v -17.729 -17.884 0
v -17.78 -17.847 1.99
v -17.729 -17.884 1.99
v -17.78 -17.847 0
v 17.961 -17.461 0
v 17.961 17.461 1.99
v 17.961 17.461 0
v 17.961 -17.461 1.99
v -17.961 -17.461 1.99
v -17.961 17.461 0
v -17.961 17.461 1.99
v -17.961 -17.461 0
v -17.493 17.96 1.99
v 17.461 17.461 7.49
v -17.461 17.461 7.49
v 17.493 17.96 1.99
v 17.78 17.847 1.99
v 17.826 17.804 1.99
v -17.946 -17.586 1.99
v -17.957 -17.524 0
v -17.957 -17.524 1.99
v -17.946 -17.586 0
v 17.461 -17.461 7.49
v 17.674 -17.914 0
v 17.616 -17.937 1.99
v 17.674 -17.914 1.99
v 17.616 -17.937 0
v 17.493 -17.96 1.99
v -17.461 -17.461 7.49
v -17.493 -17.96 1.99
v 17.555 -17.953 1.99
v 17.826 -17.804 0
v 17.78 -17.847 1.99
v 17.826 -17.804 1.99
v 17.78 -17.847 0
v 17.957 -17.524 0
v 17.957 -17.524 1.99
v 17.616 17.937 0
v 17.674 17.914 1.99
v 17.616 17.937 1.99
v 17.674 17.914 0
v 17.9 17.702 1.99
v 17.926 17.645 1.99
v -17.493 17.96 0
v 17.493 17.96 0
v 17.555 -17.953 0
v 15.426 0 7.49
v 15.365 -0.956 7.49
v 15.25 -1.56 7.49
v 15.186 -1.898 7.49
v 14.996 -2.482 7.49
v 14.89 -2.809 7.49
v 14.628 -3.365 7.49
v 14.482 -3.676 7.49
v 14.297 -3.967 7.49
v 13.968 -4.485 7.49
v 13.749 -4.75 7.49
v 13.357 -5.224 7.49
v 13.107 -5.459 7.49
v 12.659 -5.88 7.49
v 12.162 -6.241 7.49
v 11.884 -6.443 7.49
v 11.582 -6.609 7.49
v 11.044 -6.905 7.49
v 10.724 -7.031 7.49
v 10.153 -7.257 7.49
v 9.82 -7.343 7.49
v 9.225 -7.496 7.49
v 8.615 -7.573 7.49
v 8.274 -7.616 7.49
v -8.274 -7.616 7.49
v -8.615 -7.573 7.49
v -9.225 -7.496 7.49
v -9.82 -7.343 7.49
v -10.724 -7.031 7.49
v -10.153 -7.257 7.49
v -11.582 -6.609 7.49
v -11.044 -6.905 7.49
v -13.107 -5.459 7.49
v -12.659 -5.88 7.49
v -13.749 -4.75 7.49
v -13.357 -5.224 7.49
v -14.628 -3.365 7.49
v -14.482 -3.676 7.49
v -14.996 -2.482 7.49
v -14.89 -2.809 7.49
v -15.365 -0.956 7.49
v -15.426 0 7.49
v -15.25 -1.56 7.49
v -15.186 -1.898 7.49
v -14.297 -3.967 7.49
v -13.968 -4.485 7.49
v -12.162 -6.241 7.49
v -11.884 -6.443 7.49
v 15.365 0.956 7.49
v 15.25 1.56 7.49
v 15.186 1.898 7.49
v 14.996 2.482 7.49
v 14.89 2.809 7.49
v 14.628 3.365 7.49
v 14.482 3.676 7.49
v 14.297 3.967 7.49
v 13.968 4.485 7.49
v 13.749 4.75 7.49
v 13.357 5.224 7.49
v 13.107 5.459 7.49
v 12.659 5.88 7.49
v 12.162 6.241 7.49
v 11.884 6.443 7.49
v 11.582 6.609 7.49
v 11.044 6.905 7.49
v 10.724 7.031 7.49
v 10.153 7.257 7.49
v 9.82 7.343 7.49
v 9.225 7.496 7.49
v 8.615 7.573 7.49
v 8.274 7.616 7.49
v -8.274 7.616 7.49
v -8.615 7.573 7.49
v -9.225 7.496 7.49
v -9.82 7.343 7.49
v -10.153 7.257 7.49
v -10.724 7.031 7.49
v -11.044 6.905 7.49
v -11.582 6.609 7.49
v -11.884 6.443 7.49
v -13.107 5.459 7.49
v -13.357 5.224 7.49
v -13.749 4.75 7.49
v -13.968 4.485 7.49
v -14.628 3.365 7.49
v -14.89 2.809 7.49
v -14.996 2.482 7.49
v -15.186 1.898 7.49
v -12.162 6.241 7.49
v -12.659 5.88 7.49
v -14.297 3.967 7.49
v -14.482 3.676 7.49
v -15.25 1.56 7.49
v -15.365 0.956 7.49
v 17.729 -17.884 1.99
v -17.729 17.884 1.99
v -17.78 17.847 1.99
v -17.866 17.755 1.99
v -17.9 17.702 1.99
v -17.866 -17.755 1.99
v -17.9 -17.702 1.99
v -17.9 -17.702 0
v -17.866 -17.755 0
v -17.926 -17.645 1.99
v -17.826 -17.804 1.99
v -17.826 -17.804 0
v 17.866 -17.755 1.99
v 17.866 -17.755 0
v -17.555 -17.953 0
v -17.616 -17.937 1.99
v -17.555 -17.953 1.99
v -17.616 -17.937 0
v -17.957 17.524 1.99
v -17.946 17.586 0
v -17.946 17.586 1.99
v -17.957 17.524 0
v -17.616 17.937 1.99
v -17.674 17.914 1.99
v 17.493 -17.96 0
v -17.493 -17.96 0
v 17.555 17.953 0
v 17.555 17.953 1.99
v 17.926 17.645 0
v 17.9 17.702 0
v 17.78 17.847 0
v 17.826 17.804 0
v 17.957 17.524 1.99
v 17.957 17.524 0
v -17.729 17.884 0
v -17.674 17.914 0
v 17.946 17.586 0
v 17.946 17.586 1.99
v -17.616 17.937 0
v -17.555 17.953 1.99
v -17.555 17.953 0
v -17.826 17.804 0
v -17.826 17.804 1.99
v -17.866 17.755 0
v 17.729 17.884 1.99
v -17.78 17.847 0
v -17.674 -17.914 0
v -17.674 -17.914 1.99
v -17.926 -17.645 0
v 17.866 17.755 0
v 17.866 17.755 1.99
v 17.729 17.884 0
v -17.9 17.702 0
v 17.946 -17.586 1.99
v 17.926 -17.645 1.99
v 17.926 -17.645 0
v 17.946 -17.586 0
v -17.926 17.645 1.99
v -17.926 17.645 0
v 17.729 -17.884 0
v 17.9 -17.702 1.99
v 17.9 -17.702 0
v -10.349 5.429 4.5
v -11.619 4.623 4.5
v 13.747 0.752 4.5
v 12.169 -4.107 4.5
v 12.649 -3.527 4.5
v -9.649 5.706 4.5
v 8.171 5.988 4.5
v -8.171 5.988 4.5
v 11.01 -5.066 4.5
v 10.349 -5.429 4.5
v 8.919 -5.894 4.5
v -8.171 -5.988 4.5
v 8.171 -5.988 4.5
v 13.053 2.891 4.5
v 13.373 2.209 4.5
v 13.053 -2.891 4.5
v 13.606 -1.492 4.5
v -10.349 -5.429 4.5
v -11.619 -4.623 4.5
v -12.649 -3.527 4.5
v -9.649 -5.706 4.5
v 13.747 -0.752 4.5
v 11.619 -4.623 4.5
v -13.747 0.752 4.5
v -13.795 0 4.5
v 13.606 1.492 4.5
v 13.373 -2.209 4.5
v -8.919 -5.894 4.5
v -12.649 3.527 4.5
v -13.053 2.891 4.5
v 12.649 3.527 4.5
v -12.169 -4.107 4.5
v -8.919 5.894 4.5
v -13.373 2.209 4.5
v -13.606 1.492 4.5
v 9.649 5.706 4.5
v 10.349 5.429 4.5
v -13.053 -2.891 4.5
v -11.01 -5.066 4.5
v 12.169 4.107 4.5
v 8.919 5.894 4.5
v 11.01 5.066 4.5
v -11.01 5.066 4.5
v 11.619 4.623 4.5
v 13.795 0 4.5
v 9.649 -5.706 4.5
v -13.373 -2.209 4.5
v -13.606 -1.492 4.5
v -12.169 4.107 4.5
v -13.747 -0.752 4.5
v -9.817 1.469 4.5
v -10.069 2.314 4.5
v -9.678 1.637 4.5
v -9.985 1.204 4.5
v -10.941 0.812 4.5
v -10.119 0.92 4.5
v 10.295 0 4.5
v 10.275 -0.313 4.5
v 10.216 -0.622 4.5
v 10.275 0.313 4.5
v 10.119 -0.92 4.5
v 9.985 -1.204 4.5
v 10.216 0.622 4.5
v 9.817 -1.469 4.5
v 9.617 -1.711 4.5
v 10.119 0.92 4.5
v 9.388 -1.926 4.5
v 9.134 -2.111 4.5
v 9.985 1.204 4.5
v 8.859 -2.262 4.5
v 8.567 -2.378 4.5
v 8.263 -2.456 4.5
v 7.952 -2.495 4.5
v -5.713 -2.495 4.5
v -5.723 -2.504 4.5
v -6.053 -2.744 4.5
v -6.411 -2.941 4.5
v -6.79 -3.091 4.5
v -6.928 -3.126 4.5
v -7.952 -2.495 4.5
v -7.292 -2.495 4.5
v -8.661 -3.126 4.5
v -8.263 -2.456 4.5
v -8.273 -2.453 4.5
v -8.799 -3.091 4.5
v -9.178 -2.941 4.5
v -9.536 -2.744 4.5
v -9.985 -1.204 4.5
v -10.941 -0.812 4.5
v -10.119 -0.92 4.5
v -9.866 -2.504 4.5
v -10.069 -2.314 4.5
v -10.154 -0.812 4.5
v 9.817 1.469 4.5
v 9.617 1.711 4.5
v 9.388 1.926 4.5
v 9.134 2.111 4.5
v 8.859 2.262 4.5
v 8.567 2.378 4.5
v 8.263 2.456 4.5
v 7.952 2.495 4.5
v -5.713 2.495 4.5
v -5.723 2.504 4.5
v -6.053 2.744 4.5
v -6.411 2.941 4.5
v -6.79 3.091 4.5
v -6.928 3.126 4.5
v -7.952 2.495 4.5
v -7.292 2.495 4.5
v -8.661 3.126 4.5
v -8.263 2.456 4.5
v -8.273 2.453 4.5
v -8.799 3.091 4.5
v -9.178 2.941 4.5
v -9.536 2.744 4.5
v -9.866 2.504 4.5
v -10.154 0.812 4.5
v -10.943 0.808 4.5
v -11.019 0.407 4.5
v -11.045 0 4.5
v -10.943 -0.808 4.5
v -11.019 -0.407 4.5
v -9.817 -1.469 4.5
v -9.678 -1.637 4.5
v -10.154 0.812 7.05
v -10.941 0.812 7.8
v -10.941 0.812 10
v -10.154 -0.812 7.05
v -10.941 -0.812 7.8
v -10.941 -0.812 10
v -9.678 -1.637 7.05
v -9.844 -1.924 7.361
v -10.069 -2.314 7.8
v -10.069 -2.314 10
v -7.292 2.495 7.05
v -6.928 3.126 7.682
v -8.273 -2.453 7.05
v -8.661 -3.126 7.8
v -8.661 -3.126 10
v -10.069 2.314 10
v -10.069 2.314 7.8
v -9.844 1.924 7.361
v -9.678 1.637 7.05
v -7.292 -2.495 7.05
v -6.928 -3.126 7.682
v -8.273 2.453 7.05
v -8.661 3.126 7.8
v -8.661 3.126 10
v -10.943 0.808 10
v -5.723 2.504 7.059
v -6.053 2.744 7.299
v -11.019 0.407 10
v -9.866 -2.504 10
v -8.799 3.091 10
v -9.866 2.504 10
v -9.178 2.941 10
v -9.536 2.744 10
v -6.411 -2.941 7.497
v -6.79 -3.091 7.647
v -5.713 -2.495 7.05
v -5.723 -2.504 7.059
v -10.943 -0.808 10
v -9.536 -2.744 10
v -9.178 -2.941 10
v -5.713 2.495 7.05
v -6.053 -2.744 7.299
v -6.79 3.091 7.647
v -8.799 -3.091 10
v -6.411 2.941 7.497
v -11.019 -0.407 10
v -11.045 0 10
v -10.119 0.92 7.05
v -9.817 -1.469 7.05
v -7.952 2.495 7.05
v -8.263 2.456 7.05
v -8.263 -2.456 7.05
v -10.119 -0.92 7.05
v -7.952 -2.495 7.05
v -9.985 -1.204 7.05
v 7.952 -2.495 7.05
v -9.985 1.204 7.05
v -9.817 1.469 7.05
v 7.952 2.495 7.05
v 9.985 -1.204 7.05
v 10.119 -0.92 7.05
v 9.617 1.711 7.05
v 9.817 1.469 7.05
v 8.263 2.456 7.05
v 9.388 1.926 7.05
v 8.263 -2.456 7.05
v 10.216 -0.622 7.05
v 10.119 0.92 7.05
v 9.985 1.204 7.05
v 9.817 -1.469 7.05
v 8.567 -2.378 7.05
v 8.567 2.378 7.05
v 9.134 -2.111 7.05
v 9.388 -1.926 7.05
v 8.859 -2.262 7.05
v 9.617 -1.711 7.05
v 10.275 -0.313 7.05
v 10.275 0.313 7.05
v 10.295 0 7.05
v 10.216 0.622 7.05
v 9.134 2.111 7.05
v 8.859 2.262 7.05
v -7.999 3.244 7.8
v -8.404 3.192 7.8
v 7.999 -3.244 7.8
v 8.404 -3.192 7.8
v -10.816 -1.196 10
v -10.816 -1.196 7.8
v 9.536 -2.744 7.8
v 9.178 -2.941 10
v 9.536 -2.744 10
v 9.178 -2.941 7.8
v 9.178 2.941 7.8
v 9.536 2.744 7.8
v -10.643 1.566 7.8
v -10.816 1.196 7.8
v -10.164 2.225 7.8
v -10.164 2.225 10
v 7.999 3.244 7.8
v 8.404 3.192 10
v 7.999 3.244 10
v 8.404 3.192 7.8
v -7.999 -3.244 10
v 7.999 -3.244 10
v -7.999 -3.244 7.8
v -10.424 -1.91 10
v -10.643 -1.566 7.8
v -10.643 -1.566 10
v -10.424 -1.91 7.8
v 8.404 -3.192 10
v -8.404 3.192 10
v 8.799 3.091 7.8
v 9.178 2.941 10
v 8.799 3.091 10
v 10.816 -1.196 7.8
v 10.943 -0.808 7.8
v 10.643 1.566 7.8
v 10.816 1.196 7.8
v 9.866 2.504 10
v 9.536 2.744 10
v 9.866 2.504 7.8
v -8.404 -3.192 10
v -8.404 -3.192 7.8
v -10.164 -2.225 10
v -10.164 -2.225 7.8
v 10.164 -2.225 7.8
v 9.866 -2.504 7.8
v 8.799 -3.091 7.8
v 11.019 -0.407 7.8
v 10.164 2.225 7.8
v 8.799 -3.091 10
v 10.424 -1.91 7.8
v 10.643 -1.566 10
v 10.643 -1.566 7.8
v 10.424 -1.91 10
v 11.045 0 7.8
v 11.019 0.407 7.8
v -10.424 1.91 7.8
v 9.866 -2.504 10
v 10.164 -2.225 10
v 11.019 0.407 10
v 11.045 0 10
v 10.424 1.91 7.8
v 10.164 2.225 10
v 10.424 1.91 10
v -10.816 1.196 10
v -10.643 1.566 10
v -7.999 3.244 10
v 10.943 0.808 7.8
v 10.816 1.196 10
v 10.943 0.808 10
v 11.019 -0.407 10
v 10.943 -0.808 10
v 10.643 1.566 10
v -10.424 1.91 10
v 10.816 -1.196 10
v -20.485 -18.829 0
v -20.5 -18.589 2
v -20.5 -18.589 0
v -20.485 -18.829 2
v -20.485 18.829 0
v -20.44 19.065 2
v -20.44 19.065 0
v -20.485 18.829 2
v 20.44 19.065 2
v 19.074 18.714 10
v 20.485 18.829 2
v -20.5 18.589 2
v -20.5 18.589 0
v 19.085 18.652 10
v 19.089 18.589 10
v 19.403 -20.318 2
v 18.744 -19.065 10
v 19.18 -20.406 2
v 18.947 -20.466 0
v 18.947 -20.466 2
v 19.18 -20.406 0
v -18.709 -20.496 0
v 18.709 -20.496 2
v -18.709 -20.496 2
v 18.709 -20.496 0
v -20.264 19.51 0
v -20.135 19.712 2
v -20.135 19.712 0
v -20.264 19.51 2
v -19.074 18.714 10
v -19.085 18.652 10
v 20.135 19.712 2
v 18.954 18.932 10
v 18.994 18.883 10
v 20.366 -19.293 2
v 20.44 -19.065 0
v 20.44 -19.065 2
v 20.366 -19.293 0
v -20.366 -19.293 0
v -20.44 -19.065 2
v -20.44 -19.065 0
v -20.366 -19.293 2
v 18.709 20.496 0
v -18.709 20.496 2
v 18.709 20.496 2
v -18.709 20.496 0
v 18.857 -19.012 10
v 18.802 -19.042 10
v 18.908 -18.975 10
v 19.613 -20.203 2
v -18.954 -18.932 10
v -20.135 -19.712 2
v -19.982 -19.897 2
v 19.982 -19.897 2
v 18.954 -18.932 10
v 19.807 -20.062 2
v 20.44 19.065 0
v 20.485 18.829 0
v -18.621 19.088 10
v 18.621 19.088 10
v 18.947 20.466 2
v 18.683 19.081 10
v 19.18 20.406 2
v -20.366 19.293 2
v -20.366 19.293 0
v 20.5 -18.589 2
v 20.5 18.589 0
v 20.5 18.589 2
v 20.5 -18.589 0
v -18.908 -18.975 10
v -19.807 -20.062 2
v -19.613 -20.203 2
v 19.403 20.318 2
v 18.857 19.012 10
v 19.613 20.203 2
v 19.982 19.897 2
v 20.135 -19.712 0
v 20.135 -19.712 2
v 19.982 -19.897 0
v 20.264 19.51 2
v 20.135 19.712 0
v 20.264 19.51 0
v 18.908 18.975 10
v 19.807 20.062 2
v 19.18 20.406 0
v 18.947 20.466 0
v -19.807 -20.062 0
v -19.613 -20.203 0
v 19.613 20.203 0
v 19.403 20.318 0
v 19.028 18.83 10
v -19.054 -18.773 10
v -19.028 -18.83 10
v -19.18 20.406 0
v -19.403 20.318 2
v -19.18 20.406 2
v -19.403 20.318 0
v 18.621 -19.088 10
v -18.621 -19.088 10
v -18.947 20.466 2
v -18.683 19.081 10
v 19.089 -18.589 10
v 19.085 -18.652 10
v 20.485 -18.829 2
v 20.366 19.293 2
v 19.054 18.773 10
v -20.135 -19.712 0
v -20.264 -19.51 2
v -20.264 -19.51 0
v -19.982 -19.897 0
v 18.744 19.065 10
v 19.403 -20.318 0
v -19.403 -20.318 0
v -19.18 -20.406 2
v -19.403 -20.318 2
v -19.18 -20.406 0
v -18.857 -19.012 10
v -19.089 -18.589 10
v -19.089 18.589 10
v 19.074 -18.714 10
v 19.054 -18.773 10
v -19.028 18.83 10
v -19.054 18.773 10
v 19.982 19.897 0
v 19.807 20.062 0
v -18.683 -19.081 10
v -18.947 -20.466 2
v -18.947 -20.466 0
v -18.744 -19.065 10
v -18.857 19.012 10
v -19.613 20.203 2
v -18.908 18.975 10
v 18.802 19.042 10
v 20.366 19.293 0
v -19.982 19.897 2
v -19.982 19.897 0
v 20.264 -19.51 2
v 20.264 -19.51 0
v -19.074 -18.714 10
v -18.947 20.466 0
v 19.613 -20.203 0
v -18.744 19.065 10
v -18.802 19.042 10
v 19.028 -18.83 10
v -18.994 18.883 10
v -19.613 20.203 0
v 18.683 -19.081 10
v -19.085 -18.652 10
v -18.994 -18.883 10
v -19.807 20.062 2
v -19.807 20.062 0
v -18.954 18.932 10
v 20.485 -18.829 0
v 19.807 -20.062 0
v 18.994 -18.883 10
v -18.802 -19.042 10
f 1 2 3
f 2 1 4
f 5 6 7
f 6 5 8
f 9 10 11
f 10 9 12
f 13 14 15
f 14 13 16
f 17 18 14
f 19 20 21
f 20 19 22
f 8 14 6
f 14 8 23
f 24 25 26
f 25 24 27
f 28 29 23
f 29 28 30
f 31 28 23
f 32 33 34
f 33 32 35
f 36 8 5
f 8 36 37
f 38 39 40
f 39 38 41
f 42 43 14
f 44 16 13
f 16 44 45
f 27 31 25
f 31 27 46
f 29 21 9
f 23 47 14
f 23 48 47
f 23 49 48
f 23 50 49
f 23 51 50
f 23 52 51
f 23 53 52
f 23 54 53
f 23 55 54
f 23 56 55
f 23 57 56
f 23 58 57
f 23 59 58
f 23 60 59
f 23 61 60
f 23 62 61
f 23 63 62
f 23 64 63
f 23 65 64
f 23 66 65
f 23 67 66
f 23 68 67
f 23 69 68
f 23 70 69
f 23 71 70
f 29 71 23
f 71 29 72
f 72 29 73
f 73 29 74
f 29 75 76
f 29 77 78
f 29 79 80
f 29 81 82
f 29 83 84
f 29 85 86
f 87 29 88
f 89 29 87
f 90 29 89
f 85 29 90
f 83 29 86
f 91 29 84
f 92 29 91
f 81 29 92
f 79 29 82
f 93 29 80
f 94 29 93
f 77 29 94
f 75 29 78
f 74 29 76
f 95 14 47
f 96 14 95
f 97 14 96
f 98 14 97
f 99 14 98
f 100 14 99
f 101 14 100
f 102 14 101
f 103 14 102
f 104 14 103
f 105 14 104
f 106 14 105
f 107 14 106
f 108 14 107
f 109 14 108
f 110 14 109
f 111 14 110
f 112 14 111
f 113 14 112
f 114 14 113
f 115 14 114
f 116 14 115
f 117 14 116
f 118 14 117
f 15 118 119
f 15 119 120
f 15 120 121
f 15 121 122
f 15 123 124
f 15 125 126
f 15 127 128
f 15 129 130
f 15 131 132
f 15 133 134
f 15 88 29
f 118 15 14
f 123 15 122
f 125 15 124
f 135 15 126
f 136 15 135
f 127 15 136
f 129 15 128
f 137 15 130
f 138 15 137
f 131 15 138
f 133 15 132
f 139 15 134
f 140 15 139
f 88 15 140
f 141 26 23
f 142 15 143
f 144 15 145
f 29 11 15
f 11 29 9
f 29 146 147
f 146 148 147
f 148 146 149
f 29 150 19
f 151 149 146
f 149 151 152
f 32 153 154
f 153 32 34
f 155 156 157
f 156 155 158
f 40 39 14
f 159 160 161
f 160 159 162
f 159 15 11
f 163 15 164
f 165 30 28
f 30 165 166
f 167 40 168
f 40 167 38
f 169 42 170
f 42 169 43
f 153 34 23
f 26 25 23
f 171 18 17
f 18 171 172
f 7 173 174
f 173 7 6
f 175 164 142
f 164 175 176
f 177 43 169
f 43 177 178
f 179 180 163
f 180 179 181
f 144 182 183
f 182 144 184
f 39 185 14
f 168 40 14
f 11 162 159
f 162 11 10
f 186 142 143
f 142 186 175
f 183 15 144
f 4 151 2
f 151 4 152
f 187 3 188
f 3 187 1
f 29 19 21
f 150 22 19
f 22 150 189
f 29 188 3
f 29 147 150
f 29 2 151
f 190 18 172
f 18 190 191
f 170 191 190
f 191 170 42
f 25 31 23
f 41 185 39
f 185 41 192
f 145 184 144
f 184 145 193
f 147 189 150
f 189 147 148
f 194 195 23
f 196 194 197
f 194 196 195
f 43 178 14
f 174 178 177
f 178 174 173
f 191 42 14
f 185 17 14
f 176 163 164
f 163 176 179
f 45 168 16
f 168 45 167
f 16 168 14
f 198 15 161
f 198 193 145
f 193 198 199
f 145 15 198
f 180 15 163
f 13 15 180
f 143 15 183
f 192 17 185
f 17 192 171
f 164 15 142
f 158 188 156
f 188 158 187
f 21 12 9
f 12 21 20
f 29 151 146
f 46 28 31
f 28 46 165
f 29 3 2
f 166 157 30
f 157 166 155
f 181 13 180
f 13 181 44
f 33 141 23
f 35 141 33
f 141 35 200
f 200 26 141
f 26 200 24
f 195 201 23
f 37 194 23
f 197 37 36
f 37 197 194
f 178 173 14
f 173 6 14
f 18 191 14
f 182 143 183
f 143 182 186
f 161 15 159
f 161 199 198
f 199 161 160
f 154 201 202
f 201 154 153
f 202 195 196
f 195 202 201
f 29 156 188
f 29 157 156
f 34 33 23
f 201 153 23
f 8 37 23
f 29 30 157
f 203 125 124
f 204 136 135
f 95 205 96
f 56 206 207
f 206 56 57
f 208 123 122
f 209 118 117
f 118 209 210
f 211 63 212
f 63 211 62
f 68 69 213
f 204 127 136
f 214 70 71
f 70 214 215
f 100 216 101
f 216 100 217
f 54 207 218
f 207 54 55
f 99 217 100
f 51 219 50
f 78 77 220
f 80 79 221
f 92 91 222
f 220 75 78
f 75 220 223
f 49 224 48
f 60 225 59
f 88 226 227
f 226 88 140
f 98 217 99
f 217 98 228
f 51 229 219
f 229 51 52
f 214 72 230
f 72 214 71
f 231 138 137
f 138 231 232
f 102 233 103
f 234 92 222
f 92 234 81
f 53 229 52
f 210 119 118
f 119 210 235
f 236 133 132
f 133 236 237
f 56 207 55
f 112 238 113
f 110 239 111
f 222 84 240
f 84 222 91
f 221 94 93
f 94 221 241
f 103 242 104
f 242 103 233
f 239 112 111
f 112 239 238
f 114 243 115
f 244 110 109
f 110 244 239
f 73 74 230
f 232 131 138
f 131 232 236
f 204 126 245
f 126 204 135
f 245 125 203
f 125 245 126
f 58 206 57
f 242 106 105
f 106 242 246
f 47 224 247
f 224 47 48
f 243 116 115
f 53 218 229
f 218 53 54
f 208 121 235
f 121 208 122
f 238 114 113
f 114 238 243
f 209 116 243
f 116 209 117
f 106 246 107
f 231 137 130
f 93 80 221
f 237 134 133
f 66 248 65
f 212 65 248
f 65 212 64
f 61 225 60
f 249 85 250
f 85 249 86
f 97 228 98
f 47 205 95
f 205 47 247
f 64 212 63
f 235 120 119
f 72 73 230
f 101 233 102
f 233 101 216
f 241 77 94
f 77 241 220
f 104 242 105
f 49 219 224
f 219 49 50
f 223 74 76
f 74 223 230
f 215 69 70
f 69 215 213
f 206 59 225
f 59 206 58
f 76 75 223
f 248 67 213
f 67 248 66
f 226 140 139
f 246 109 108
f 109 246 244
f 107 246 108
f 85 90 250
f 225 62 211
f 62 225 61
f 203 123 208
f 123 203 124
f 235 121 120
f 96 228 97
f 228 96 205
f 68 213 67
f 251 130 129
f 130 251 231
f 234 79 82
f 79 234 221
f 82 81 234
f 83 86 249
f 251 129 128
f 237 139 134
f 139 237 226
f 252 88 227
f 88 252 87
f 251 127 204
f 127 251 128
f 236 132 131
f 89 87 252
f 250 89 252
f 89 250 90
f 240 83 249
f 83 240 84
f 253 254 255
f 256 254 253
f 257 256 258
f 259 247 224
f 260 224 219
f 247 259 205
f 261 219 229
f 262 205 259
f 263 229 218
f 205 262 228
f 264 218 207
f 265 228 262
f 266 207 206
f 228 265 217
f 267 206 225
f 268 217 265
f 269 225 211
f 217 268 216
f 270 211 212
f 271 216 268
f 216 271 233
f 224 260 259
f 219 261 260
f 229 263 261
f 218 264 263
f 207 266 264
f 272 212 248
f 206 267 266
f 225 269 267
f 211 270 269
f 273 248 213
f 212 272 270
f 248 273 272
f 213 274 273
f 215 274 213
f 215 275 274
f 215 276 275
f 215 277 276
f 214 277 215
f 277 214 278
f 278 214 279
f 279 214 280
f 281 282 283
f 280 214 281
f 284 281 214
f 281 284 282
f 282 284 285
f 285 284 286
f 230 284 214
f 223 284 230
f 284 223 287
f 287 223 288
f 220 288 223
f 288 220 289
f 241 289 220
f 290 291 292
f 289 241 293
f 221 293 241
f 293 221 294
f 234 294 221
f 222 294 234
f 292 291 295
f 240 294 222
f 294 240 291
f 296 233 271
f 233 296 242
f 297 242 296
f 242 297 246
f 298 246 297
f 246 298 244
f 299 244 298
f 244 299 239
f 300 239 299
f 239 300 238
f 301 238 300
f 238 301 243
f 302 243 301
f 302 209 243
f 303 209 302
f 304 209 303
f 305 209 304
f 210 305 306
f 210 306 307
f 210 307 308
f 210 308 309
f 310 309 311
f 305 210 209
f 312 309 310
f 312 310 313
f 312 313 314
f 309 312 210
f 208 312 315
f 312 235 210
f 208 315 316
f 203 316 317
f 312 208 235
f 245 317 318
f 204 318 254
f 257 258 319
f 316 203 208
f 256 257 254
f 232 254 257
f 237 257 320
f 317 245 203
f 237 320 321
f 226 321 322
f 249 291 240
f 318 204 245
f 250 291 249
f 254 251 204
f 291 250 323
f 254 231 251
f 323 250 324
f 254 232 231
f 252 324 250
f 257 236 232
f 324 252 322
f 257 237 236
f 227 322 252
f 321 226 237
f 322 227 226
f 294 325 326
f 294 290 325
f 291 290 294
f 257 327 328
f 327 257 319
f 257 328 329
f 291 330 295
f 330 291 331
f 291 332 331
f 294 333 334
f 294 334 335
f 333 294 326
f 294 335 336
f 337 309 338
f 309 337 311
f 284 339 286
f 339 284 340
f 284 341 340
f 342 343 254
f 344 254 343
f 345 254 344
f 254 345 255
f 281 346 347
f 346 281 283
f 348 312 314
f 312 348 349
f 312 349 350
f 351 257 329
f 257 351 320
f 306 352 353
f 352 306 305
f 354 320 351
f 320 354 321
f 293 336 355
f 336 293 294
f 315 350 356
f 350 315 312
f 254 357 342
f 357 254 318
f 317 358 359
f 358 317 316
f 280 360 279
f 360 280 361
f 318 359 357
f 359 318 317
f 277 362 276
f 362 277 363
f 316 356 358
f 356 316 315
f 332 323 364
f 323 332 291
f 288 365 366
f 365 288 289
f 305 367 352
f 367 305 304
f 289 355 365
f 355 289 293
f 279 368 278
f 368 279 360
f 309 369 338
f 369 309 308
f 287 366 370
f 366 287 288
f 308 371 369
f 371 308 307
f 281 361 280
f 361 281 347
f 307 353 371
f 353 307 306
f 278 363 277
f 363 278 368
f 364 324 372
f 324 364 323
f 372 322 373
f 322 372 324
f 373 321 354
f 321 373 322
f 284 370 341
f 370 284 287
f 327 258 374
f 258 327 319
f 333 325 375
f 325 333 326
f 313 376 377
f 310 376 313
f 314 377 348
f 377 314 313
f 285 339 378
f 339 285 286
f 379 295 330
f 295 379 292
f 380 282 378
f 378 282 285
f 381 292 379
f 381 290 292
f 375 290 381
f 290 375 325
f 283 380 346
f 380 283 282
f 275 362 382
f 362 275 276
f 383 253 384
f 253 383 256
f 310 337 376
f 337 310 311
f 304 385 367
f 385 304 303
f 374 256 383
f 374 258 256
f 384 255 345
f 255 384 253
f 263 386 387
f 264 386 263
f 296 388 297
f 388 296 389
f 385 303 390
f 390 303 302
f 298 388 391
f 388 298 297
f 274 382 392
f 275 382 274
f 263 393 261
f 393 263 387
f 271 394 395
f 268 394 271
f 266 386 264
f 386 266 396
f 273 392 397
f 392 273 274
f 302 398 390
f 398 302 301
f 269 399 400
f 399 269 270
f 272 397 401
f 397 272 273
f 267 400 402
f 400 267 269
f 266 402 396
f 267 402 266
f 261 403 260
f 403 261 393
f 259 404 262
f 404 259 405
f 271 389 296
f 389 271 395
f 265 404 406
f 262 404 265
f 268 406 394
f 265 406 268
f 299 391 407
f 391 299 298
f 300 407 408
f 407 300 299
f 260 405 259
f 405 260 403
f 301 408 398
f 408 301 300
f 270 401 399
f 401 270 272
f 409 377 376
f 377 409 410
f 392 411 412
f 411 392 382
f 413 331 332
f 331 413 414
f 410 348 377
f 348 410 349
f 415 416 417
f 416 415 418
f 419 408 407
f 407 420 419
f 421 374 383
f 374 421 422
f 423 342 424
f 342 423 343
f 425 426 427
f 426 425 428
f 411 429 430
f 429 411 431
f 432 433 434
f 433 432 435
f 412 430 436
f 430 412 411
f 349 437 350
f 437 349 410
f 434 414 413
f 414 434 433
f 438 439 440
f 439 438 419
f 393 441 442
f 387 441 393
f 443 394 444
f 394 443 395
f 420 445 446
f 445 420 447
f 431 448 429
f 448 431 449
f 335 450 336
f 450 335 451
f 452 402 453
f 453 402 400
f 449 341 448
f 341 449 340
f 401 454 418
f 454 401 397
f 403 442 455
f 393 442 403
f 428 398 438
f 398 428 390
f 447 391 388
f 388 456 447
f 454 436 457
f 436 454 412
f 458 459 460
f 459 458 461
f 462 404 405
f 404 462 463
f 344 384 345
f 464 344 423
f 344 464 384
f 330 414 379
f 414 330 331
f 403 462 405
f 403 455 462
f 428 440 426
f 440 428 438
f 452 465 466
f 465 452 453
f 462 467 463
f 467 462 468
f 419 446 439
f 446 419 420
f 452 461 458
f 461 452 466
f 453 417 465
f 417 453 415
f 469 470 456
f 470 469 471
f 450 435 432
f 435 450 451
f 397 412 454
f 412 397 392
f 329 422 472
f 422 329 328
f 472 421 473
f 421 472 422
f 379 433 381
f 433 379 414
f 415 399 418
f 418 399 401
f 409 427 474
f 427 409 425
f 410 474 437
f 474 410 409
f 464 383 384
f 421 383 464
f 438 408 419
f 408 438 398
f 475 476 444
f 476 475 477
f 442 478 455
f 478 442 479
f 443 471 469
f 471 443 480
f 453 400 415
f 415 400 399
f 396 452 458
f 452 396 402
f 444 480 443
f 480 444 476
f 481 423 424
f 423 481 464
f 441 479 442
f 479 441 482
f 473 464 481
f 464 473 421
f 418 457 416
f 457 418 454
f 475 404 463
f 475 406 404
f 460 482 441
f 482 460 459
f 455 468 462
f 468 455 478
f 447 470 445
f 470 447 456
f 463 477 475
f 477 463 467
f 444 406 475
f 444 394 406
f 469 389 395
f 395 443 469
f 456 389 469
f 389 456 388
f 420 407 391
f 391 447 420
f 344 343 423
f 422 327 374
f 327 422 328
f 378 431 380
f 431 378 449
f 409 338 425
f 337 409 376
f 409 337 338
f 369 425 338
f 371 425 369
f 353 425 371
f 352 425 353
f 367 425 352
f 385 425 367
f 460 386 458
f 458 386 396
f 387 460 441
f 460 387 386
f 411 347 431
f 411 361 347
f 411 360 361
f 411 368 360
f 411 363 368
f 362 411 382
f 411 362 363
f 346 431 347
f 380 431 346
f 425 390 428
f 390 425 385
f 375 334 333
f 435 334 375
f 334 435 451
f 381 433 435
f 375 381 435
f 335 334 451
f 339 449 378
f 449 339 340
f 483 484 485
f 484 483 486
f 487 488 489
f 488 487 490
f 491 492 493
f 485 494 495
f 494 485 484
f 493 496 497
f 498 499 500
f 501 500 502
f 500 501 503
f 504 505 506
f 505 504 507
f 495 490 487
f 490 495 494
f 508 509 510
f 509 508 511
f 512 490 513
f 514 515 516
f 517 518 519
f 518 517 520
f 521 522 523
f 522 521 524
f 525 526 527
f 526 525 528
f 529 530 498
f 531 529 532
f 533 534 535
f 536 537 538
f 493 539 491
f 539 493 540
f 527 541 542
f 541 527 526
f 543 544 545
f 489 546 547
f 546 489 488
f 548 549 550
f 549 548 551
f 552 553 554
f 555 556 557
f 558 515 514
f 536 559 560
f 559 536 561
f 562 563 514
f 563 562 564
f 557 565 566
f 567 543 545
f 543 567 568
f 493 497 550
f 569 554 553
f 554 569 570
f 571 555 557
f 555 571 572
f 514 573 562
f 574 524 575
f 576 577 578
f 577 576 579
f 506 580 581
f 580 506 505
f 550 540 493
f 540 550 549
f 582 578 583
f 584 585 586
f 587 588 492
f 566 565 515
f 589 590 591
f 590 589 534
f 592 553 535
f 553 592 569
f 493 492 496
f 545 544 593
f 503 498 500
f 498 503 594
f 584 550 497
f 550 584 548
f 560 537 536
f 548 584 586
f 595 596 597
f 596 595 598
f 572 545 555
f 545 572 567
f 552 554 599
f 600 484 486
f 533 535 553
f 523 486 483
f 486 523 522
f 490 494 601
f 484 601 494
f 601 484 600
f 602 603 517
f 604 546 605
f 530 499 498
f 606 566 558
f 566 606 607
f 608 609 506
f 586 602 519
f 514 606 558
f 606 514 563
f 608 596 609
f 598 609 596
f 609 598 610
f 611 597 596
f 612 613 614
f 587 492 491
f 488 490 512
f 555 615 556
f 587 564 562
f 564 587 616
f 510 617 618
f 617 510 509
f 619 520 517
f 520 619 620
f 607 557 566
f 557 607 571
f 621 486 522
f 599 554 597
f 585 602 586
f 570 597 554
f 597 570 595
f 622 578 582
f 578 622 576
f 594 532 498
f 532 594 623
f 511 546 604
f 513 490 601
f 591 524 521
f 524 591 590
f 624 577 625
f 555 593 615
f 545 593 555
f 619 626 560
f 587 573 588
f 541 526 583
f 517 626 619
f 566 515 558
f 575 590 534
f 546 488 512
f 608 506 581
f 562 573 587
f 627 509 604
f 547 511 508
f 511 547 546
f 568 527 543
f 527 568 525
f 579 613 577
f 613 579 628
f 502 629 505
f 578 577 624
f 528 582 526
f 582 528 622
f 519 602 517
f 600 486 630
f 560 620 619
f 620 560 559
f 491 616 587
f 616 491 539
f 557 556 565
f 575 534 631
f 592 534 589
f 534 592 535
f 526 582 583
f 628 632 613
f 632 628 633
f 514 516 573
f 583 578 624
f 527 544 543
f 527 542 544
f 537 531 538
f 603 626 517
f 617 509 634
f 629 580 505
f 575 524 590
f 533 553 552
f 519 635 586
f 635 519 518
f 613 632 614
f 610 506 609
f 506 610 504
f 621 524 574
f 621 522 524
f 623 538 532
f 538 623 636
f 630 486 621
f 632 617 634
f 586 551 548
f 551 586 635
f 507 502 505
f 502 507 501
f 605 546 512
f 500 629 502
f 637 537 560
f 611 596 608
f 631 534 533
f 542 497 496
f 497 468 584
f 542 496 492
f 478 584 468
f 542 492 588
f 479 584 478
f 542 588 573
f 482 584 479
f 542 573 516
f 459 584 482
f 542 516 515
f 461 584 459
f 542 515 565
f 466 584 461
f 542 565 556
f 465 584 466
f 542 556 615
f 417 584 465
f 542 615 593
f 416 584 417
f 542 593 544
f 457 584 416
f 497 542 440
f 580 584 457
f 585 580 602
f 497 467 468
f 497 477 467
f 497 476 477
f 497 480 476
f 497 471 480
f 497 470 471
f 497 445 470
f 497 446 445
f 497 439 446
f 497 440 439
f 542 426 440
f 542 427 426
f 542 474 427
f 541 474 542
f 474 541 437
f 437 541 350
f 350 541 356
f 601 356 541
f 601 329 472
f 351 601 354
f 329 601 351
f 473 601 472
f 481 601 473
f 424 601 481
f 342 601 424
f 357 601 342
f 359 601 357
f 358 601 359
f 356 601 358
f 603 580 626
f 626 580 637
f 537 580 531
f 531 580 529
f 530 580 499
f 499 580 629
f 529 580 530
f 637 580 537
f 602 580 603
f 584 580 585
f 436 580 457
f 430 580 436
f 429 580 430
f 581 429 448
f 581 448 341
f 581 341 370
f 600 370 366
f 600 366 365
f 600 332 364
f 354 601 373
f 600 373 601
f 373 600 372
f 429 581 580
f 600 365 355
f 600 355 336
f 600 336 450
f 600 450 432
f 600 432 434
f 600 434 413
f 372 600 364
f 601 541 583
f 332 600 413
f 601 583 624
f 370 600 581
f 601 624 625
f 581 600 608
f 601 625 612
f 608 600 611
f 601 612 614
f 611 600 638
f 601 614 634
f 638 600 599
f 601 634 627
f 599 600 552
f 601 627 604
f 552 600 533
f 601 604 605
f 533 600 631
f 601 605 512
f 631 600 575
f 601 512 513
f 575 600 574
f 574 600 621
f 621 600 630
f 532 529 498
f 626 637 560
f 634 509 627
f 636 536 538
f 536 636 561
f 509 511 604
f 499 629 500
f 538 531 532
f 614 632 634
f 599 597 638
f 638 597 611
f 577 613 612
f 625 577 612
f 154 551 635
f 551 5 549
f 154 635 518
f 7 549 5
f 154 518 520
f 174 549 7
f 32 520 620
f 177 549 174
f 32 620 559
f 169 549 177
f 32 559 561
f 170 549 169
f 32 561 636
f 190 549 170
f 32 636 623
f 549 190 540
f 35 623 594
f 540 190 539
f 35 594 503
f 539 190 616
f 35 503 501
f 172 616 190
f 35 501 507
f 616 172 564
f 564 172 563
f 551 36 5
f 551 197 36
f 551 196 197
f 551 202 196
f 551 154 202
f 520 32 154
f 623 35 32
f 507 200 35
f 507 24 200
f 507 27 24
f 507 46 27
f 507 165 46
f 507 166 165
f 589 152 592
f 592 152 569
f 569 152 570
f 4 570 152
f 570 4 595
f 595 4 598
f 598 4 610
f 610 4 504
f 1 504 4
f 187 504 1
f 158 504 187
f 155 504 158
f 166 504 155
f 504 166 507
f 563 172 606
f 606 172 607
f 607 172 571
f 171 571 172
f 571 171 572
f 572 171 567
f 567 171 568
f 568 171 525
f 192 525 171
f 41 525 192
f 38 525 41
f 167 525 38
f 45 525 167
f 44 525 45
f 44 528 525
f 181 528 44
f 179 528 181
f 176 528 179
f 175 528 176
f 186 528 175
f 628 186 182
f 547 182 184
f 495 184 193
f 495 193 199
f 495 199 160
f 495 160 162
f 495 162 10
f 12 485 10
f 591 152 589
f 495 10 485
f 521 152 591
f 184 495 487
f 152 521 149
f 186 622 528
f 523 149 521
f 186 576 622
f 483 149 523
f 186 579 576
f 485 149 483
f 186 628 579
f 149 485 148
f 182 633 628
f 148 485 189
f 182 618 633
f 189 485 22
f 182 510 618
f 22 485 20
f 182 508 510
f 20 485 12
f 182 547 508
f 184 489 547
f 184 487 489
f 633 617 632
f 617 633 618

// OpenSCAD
// Tripod Mount Plate

//
// Plate dimensions
//

// Plate X size, mm
size_x = 41;
// Plate Y size, mm
size_y = 41;

// Wall thickness, mm
wall_thickness = 2.5;

// Slope of side walls, degrees
side_slope = 10;
// Height of non-sloped part of the wall, must be > 0
slope_start_height = 2;

// Radius of plat corners, mm
top_corner_radius = 0.5;

//
// Screw properties
//

// Screw full length, including head, mm
screw_full_length = 14.3;

// How much of the screw should stick outside, mm.  Usually it is the deepness of mount screw hole in the camera
screw_work_length = 4.8;
// Length of non-threaded screw part (grip, neck, shank), mm
screw_shank_length = 3.5;

// Diameter of non-threaded screw part, mm.  Determines the narrower part of the slot
shank_shaft_diameter = 5.0;
// Diameter of threaded part screw port, mm.  Determines the wider part of the slot
thread_shaft_diameter = 6.5;

// Length of the screw head, mm
screwhead_length = 4;
// Diameter of the screw head, mm
screwhead_diameter = 12;

//
// computed properties
//
$fn = 0 + 50;

size_z = 0.5 + screw_full_length - screw_work_length;
wall_x = wall_thickness / cos(side_slope);

slope_x = (size_z - slope_start_height) * tan(side_slope);

internal_size_x = size_x - slope_x;
bottom_corner_radius = top_corner_radius + slope_x;

shank_shaft_radius = shank_shaft_diameter / 2;
thread_shaft_radius = thread_shaft_diameter / 2;
screwhead_radius = screwhead_diameter / 2;

screw_length = screw_full_length - screwhead_length;
screw_thread_length = screw_length - screw_shank_length;
screw_inside_length = screw_length - screw_work_length;
threaded_shaft_length = size_z - screw_thread_length;

slot_start = internal_size_x / 2 - screwhead_diameter;
slot_end = -slot_start;

module plate() {
  difference()
  {
      plateBlock();
      drillouts();
  }
}

module plateBlock() {
  roundedCube(size_x, size_y, size_z, bottom_corner_radius, top_corner_radius);
}


module roundedCube(x, y, z, r1, r2)
{
    translate([-x/2 + r1, -y / 2 + r1, 0])
      minkowski() {
        cube([x-2*r1,y-2*r1,slope_start_height]);
        cylinder(r1=r1,r2=r2,h = z - slope_start_height);
      };
}

module drillouts() {
    internalFacet();
    shankShaft();
    threadedShaft();
    eye();
}

module internalFacet() {
  difference() {
    translate([0, 0, -0.01])
    roundedCube(
      size_x - 2 * wall_x,
      size_y - 2 * wall_x,
      size_z - wall_thickness,
      top_corner_radius, 0);
    screwheadPad();
  }
}

module shankShaft() {
  hull() {
    translate([slot_start, 0, 0]) shankShaftBase();
    translate([slot_end, 0, 0]) shankShaftBase();
  }
}

module shankShaftBase() {
  cylinder(h=size_z + 0.01, r=shank_shaft_radius);
}

module threadedShaft() {
  hull() {
    translate([slot_start, 0, 0]) threadedShaftBase();
    translate([slot_end, 0, 0]) threadedShaftBase();
  }
}

module threadedShaftBase() {
  translate([0, 0, size_z + 1])
  hull() {
    translate([0, 0, -thread_shaft_radius])
      cylinder(r1 = 0, r2 = thread_shaft_radius, h = thread_shaft_radius);
    translate([0, 0, -thread_shaft_radius - threaded_shaft_length])
      cylinder(r1 = 0, r2 = thread_shaft_radius, h = thread_shaft_radius);
  }
}

module eye() {
  translate([slot_end, 0, 0]) {
    cylinder(h=size_z + 0.01, r = shank_shaft_radius);
    intersection() {
      cylinder(h=size_z + 0.01, r = thread_shaft_radius);
      for(angle = [0:60:360]) {
        rotate(angle)
          cube(size=[thread_shaft_radius * 10, thread_shaft_radius * 0.5, 2 * size_z + 2], center=true);
      }
    }
  }
}

module screwheadPad() {
  z_start = 0.5 + screwhead_length;
  h = size_z - z_start;

  translate([0, 0, z_start])
  hull() {
    translate([slot_start, 0, 0]) screwheadPadBase(h);
    translate([slot_end, 0, 0]) screwheadPadBase(h);
  }
}

module screwheadPadBase(h) {
      cylinder(
        r1 = screwhead_radius,
        r2 = screwhead_radius + 3,
        h = h
      );
}

plate();
